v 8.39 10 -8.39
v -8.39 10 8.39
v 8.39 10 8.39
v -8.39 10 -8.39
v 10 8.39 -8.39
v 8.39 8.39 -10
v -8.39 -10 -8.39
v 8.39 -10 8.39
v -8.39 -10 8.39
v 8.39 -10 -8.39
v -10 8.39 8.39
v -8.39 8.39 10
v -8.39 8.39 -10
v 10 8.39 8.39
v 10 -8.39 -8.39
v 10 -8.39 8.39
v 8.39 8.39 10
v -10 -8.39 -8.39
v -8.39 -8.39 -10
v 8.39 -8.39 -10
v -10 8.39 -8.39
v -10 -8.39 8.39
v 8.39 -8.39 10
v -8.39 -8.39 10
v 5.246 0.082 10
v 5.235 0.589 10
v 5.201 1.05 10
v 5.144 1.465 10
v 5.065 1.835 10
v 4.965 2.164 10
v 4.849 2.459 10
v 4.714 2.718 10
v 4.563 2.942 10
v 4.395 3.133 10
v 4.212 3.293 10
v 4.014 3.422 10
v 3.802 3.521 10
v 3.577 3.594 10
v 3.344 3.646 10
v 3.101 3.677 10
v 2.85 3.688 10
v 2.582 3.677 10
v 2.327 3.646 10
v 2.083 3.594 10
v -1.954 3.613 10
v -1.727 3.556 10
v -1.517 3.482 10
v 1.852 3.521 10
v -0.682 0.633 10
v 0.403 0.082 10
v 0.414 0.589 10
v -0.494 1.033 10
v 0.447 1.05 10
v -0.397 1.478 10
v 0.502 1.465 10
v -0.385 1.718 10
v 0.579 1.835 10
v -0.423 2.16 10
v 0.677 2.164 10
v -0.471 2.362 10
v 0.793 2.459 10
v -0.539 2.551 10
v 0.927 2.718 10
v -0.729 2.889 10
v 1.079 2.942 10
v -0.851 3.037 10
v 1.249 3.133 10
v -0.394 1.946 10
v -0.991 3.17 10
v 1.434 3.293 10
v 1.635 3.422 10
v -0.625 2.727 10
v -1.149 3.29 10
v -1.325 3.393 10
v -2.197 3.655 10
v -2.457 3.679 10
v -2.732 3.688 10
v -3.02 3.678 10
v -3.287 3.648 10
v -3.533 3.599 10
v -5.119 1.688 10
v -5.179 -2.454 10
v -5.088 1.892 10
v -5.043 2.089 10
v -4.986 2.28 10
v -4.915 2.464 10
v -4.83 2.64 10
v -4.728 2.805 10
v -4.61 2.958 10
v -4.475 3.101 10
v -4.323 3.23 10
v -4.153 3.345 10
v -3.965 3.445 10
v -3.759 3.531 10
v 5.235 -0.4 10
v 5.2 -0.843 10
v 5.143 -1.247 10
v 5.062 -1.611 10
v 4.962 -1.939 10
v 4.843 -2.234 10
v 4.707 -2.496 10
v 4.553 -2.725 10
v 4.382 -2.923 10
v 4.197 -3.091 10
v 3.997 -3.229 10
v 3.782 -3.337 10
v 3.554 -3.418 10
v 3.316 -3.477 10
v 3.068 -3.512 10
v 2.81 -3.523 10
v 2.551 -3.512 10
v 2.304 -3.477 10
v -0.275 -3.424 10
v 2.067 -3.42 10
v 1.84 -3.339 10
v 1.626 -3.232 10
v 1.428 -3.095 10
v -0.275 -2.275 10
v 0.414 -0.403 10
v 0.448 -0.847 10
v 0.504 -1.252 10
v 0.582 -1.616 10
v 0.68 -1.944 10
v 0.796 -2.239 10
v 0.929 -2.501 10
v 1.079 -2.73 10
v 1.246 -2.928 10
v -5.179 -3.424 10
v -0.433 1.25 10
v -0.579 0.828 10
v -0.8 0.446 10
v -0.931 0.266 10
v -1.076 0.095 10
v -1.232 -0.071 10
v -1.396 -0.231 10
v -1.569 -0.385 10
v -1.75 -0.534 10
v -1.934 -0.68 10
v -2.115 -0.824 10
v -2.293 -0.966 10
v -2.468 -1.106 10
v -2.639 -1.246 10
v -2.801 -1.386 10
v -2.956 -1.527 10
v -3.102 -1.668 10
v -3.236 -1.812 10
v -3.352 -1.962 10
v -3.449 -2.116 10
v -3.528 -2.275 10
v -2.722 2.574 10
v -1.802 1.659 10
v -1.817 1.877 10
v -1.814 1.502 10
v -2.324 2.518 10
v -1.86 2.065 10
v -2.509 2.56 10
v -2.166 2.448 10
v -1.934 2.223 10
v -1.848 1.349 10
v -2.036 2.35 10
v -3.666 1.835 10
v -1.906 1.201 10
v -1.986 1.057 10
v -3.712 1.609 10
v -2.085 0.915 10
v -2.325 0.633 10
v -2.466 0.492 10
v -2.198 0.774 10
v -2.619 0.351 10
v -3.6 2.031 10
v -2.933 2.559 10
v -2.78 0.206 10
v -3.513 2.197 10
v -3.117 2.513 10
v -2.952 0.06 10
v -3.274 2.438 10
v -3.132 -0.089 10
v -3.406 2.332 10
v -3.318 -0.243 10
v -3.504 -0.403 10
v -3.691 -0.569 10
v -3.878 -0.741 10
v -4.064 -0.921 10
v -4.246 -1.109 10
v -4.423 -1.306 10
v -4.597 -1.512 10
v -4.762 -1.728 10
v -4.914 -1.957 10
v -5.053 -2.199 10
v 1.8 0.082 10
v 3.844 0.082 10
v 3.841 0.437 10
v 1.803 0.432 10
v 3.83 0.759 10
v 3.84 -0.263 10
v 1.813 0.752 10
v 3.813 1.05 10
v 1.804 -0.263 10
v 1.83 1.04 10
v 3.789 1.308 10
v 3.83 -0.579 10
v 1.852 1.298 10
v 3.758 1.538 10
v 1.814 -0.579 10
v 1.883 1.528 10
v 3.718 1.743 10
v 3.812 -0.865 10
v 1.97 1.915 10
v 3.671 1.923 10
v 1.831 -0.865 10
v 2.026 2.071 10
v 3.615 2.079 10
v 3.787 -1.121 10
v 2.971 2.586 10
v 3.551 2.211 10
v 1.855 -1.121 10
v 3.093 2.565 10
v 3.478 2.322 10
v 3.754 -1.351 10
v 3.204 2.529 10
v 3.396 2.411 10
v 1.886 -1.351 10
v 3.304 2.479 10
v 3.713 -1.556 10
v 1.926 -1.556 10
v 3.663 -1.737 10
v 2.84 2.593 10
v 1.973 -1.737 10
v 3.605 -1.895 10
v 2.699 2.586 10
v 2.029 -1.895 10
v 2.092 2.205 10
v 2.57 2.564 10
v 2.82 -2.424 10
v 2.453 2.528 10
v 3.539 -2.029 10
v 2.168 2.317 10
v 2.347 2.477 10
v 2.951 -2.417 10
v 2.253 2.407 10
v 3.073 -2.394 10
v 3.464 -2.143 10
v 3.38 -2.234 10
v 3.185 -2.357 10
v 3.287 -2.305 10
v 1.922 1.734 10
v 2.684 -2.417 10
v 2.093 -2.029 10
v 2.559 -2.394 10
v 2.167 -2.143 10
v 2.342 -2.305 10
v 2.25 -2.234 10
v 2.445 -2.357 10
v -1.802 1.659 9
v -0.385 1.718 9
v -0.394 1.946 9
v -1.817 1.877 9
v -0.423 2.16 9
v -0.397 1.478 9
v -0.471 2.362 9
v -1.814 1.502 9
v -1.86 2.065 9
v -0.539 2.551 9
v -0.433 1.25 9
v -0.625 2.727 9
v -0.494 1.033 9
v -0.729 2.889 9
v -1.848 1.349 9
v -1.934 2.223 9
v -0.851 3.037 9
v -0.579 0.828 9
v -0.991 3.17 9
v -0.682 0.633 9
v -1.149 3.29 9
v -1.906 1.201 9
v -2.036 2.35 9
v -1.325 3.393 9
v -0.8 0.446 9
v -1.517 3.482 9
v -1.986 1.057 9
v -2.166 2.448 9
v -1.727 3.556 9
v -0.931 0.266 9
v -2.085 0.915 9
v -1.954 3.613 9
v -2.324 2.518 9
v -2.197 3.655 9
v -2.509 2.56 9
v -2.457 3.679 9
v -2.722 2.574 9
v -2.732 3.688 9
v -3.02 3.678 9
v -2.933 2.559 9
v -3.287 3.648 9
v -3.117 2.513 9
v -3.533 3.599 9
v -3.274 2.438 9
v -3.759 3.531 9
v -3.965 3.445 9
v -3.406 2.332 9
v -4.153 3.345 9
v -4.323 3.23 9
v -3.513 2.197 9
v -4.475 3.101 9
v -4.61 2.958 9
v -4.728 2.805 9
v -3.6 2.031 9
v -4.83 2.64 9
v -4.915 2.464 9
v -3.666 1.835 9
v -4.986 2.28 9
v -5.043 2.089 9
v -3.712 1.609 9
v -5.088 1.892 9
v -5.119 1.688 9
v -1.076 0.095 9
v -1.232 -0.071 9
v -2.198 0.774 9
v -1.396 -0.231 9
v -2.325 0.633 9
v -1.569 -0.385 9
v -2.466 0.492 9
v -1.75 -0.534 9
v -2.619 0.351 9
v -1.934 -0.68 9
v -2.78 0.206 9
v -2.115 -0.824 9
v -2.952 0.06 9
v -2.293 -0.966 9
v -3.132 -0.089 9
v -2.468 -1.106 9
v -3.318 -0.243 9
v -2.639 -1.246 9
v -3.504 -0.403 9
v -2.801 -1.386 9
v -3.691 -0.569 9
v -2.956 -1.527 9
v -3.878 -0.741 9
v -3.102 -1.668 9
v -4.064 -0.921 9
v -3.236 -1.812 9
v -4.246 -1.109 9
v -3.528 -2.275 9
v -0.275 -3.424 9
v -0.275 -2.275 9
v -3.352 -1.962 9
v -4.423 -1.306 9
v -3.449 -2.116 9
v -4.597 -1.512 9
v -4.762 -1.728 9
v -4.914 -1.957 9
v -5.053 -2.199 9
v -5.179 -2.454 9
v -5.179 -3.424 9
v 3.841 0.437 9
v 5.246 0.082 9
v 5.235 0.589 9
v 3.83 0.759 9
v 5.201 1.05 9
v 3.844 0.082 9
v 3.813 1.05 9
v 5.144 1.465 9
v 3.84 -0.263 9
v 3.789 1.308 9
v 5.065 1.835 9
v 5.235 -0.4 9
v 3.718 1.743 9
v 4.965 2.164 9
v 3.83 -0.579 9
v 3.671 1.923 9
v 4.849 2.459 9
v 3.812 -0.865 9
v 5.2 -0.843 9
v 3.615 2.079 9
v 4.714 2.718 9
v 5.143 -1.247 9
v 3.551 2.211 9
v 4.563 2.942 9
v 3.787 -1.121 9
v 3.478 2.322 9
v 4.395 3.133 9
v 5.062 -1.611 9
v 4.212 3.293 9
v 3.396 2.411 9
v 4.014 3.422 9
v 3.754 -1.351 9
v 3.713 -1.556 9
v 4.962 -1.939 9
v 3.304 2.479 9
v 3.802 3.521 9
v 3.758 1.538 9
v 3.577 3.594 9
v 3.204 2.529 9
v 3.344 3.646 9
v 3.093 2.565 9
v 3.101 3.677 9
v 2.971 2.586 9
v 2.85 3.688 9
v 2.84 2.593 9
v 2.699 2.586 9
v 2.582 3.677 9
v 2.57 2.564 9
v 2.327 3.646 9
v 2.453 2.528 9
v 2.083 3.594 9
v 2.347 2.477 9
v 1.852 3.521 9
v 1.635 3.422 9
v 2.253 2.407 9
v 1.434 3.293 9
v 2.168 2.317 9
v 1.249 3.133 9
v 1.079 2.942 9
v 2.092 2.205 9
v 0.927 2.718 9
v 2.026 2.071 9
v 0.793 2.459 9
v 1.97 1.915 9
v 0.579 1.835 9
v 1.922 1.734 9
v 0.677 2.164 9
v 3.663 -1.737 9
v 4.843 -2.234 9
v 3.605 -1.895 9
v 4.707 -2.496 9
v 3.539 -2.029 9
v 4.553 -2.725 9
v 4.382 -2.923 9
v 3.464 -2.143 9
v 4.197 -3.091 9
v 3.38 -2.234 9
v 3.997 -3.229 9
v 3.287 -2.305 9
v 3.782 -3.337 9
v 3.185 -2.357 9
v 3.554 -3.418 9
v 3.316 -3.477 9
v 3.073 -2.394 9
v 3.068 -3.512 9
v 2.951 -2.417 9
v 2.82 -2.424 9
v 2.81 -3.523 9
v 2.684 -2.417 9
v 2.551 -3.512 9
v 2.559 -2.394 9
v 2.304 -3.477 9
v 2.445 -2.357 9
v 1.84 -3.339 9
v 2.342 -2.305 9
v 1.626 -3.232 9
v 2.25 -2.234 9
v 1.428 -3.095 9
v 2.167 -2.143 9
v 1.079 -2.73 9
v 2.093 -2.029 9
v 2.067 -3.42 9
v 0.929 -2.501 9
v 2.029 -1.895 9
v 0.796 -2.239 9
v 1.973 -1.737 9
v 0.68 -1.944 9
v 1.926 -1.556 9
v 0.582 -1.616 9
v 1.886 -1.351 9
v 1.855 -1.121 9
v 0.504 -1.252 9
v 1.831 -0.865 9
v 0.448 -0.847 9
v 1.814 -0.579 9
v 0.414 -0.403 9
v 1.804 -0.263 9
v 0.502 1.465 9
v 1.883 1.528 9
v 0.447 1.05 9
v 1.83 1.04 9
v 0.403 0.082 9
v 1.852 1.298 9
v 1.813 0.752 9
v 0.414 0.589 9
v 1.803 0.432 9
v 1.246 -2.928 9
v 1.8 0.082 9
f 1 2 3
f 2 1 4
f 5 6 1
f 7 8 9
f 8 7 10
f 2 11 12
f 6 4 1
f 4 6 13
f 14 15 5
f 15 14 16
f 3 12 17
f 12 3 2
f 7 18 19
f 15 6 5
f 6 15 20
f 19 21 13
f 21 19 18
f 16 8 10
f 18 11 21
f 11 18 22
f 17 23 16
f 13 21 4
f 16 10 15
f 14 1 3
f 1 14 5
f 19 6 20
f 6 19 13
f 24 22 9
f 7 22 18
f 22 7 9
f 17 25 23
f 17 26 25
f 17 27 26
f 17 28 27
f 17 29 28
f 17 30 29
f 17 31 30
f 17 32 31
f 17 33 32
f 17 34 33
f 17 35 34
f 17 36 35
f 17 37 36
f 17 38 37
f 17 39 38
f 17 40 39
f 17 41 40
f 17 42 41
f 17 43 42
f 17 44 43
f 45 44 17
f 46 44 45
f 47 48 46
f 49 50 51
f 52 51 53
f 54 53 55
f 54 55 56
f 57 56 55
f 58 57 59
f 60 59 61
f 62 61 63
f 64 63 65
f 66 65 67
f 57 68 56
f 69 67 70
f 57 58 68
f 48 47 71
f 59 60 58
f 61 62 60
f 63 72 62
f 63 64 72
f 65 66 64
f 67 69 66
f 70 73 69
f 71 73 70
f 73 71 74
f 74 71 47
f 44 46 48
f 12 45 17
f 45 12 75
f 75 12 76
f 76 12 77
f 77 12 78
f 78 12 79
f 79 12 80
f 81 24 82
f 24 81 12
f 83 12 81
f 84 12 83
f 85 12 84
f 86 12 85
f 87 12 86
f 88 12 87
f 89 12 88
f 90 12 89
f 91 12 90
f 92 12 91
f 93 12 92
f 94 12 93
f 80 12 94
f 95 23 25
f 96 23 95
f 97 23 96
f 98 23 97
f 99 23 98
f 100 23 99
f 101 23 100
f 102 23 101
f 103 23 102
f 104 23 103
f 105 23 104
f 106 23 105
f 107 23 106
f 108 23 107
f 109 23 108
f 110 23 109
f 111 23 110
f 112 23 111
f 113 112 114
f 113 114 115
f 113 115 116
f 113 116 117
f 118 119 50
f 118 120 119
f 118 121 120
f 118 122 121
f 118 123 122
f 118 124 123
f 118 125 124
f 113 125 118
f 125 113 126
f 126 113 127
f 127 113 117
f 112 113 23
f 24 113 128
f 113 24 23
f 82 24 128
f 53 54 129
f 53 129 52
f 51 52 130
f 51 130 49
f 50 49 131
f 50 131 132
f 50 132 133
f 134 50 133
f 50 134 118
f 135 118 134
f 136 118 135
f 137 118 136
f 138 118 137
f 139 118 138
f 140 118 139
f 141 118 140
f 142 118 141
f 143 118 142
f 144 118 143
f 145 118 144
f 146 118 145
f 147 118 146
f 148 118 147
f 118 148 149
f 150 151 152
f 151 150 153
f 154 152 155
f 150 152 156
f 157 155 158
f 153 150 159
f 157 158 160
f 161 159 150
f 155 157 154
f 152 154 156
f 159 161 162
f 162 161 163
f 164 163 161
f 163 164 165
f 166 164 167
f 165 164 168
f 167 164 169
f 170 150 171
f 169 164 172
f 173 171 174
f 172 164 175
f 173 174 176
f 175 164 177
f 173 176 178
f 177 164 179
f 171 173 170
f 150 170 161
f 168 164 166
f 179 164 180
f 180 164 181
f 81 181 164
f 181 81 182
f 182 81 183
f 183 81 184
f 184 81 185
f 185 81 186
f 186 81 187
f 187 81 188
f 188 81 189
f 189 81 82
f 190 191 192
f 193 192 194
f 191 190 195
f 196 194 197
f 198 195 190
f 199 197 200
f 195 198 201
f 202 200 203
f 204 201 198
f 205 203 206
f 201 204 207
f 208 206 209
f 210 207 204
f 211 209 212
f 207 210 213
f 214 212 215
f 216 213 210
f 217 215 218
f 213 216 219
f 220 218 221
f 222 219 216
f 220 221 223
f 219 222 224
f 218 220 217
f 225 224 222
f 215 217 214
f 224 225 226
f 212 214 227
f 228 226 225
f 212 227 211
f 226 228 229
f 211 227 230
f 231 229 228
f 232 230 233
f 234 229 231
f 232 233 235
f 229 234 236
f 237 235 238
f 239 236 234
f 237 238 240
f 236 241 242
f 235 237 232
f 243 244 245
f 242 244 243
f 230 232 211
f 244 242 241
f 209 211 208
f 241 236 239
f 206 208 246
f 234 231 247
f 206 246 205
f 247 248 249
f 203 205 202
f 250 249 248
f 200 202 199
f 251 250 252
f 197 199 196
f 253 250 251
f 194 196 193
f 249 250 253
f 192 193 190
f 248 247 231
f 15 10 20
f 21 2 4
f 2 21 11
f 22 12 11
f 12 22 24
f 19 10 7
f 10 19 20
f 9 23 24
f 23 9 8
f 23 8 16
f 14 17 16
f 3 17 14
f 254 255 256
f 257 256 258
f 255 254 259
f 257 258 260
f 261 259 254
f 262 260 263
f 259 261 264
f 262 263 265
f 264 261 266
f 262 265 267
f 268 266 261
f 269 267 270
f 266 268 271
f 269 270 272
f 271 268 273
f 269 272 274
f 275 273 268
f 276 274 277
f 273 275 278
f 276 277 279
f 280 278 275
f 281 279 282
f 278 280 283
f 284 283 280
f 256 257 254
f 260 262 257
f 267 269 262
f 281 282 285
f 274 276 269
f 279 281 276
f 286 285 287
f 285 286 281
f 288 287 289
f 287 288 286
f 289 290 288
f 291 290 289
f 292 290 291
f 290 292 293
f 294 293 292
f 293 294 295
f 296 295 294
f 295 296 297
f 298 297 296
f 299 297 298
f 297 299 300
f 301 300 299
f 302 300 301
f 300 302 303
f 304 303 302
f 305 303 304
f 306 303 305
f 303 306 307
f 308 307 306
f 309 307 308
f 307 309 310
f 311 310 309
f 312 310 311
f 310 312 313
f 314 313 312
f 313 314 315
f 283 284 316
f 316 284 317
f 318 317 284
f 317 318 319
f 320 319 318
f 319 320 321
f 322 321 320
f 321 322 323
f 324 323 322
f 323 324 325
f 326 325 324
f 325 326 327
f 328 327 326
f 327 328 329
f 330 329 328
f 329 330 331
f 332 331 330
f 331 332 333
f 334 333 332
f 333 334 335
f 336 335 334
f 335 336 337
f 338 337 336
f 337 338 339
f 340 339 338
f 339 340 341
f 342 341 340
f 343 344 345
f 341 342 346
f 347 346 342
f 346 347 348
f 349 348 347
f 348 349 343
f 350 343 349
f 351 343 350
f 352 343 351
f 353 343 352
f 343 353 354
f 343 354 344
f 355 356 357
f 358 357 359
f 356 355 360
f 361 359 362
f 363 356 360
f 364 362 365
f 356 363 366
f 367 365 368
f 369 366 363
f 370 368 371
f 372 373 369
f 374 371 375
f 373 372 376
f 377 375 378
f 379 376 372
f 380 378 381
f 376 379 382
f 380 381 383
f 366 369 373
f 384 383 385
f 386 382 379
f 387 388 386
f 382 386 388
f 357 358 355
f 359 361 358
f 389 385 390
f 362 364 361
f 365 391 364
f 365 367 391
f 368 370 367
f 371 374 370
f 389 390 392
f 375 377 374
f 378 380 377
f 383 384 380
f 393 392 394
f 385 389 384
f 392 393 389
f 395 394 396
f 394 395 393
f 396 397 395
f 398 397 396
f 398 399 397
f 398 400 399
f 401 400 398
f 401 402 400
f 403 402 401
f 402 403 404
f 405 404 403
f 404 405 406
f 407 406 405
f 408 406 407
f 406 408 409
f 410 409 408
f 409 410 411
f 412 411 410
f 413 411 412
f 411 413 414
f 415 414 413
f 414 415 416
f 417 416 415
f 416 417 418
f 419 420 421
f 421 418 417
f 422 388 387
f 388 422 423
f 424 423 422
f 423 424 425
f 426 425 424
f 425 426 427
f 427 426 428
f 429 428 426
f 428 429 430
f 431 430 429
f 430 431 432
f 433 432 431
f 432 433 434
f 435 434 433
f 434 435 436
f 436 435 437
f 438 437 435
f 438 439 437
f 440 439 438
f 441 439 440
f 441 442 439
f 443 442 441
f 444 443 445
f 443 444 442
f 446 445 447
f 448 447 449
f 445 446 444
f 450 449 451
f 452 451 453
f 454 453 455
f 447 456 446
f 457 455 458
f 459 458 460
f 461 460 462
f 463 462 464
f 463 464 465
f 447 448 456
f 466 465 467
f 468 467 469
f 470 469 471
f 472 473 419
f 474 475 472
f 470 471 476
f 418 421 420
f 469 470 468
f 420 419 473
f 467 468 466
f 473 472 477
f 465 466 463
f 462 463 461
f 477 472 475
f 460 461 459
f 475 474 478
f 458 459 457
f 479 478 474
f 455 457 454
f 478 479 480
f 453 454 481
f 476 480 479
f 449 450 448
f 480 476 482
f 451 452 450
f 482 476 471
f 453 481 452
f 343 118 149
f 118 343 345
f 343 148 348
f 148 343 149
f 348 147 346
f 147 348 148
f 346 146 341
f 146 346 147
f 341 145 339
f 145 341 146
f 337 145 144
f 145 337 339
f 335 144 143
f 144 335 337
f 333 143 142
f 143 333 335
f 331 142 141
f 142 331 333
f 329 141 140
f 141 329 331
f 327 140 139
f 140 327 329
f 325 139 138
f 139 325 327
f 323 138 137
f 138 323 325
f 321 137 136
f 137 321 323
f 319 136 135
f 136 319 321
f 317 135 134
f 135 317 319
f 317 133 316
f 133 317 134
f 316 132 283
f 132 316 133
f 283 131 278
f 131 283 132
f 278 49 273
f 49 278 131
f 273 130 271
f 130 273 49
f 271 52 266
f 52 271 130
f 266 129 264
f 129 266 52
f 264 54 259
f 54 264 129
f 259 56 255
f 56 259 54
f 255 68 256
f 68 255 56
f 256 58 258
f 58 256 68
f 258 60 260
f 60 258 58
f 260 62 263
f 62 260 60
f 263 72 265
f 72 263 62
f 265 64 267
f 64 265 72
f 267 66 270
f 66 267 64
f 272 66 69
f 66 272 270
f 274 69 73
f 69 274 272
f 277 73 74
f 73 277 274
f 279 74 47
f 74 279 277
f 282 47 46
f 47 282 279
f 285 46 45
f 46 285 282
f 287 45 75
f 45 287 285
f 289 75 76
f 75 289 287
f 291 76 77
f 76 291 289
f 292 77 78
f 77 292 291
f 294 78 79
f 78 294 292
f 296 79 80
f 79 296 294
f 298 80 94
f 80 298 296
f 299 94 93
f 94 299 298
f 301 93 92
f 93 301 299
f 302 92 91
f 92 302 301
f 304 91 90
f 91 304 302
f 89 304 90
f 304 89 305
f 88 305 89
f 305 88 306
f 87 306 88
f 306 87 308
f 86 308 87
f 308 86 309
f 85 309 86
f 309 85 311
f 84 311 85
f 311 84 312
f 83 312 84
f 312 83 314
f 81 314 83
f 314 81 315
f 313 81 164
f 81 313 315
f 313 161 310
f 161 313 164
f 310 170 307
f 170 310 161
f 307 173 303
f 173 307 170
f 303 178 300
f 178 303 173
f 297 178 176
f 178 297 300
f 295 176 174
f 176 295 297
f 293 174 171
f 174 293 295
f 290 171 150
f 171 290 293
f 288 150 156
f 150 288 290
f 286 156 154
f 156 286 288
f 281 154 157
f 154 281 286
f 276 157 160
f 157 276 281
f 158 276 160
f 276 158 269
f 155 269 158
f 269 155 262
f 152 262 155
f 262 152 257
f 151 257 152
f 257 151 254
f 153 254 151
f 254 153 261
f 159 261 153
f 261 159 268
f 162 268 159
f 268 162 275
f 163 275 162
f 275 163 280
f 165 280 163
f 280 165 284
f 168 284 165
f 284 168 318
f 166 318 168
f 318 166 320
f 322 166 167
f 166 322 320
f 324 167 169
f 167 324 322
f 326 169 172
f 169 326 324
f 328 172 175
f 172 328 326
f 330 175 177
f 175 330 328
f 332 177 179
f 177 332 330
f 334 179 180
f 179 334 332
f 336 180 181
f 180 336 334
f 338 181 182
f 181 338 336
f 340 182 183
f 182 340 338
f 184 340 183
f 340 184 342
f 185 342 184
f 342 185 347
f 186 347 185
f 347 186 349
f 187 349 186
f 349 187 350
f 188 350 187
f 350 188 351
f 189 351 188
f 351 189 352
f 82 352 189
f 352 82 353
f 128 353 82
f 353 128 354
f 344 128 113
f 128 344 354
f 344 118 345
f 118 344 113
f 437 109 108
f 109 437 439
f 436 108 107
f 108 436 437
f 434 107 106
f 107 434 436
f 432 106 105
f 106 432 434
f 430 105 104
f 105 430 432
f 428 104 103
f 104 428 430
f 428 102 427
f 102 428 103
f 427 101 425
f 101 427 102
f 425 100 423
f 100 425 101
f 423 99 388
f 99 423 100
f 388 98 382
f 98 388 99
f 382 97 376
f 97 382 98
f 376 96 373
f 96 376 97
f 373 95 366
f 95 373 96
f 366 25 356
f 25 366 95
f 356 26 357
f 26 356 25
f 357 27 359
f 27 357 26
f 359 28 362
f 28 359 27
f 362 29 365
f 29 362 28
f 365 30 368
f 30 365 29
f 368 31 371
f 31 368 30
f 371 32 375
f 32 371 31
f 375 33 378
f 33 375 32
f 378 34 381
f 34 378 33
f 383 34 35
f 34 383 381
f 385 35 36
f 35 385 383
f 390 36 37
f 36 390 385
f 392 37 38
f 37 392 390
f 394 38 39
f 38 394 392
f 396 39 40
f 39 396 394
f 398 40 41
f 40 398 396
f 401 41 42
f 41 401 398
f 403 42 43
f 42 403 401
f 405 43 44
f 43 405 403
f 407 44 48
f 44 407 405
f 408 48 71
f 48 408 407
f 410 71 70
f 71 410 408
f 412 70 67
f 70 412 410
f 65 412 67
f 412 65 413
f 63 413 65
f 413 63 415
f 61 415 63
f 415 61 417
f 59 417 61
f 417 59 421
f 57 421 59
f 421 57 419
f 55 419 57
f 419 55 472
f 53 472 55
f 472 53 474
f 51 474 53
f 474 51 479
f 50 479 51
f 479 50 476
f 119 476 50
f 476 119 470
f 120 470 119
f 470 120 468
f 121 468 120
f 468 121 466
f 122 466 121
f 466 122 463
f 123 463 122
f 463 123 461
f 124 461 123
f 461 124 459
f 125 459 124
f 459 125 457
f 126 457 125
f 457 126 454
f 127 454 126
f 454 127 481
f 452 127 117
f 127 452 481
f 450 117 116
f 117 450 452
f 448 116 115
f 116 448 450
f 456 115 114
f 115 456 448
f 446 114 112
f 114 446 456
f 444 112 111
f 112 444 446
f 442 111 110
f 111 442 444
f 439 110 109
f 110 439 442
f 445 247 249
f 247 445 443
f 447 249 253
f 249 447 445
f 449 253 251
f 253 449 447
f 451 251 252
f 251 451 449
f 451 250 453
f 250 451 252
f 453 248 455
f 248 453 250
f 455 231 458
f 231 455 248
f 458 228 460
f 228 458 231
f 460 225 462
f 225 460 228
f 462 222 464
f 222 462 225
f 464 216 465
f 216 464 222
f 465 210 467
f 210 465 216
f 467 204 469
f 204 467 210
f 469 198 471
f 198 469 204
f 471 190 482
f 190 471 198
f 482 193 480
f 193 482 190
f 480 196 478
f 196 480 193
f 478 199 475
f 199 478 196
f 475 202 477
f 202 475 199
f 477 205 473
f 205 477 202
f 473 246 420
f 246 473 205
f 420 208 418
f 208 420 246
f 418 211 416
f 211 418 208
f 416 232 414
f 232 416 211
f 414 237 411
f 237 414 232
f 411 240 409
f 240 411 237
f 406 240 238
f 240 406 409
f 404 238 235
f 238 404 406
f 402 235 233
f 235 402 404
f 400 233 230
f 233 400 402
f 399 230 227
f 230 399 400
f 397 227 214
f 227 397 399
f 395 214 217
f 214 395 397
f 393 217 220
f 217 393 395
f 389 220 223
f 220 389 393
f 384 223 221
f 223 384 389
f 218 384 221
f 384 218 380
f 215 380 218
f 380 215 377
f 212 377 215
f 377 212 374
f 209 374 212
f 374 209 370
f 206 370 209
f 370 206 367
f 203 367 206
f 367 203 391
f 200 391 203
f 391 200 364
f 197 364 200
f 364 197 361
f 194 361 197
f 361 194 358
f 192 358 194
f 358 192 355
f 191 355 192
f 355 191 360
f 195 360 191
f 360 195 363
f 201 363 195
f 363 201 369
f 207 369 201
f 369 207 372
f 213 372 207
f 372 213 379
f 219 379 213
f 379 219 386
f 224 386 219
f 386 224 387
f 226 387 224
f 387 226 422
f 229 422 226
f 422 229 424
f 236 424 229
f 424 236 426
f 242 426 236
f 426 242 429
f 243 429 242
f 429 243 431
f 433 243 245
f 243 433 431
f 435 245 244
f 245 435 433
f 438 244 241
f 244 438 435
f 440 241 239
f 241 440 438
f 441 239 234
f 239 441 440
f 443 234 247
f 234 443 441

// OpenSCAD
//Cube dimensions in mm
x=20;//[1:1:200]
//Text recess in mm, 0=off
texton=1;//[0:0.1:1]
size=x/2;

    difference() {
scale([x/2,x/2,x/2]) Cube();
        if (texton>0) {
        translate([0,0,size-texton]) {
            // convexity is needed for correct preview
            // since characters can be highly concave
            linear_extrude(height=2, convexity=4)
 
                text(str(x), 
                     size=size*22/30,
                     font="Liberation Sans:style=Bold",
                     halign="center",
                     valign="center");
        }
    }
    }


// Functions and Utilities
function Cube_dimX() = 2.00;
function Cube_dimY() = 2.00;
function Cube_dimZ() = 2.00;
function Cube_multmatrix() = [[1.000000,0.000000,0.000000,0.000000],[0.000000,1.000000,0.000000,0.000000],[0.000000,0.000000,1.000000,0.000000],[0.000000,0.000000,0.000000,1.000000]];

/////////////////////
// geometry for Cube
function Cube_faces() = [
[9,2,12],[23,9,12],[19,15,4],[6,19,4],[21,18,7],[11,21,7],[20,22,13],[17,20,13],[16,14,0],[3,16,0],[2,1,0],[5,4,3],[8,7,6],[11,10,9],[14,13,12],[17,16,15],[20,19,18],[23,22,21],[5,3,0],[1,5,0],[9,10,1],[2,9,1],[14,12,2],[0,14,2],[8,6,4],[5,8,4],[15,16,3],[4,15,3],[10,11,7],[8,10,7],[18,19,6],[7,18,6],[23,21,11],[9,23,11],[16,17,13],[14,16,13],[22,23,12],[13,22,12],[19,20,17],[15,19,17],[21,22,20],[18,21,20],[8,5,1],[10,8,1]];
function Cube_points() = [
[1.000000,0.839000,-0.839000],[0.839000,0.839000,-1.000000],[0.839000,1.000000,-0.839000],[1.000000,-0.839000,-0.839000],[0.839000,-1.000000,-0.839000],[0.839000,-0.839000,-1.000000],[-0.839000,-1.000000,-0.839000],[-1.000000,-0.839000,-0.839000],[-0.839000,-0.839000,-1.000000],[-0.839000,1.000000,-0.839000],[-0.839000,0.839000,-1.000000],[-1.000000,0.839000,-0.839000],[0.839000,1.000000,0.839000],[0.839000,0.839000,1.000000],[1.000000,0.839000,0.839000],[0.838999,-1.000000,0.839000],[1.000000,-0.839001,0.839000],[0.838999,-0.839000,1.000000],[-1.000000,-0.839000,0.839000],[-0.839000,-1.000000,0.839000],[-0.839000,-0.839000,1.000000],[-1.000000,0.839000,0.839000],[-0.839000,0.839000,1.000000],[-0.839000,1.000000,0.839000]];module Cube() {
    multmatrix(Cube_multmatrix()) polyhedron(faces = Cube_faces(), points = Cube_points(), convexity=10);
};
